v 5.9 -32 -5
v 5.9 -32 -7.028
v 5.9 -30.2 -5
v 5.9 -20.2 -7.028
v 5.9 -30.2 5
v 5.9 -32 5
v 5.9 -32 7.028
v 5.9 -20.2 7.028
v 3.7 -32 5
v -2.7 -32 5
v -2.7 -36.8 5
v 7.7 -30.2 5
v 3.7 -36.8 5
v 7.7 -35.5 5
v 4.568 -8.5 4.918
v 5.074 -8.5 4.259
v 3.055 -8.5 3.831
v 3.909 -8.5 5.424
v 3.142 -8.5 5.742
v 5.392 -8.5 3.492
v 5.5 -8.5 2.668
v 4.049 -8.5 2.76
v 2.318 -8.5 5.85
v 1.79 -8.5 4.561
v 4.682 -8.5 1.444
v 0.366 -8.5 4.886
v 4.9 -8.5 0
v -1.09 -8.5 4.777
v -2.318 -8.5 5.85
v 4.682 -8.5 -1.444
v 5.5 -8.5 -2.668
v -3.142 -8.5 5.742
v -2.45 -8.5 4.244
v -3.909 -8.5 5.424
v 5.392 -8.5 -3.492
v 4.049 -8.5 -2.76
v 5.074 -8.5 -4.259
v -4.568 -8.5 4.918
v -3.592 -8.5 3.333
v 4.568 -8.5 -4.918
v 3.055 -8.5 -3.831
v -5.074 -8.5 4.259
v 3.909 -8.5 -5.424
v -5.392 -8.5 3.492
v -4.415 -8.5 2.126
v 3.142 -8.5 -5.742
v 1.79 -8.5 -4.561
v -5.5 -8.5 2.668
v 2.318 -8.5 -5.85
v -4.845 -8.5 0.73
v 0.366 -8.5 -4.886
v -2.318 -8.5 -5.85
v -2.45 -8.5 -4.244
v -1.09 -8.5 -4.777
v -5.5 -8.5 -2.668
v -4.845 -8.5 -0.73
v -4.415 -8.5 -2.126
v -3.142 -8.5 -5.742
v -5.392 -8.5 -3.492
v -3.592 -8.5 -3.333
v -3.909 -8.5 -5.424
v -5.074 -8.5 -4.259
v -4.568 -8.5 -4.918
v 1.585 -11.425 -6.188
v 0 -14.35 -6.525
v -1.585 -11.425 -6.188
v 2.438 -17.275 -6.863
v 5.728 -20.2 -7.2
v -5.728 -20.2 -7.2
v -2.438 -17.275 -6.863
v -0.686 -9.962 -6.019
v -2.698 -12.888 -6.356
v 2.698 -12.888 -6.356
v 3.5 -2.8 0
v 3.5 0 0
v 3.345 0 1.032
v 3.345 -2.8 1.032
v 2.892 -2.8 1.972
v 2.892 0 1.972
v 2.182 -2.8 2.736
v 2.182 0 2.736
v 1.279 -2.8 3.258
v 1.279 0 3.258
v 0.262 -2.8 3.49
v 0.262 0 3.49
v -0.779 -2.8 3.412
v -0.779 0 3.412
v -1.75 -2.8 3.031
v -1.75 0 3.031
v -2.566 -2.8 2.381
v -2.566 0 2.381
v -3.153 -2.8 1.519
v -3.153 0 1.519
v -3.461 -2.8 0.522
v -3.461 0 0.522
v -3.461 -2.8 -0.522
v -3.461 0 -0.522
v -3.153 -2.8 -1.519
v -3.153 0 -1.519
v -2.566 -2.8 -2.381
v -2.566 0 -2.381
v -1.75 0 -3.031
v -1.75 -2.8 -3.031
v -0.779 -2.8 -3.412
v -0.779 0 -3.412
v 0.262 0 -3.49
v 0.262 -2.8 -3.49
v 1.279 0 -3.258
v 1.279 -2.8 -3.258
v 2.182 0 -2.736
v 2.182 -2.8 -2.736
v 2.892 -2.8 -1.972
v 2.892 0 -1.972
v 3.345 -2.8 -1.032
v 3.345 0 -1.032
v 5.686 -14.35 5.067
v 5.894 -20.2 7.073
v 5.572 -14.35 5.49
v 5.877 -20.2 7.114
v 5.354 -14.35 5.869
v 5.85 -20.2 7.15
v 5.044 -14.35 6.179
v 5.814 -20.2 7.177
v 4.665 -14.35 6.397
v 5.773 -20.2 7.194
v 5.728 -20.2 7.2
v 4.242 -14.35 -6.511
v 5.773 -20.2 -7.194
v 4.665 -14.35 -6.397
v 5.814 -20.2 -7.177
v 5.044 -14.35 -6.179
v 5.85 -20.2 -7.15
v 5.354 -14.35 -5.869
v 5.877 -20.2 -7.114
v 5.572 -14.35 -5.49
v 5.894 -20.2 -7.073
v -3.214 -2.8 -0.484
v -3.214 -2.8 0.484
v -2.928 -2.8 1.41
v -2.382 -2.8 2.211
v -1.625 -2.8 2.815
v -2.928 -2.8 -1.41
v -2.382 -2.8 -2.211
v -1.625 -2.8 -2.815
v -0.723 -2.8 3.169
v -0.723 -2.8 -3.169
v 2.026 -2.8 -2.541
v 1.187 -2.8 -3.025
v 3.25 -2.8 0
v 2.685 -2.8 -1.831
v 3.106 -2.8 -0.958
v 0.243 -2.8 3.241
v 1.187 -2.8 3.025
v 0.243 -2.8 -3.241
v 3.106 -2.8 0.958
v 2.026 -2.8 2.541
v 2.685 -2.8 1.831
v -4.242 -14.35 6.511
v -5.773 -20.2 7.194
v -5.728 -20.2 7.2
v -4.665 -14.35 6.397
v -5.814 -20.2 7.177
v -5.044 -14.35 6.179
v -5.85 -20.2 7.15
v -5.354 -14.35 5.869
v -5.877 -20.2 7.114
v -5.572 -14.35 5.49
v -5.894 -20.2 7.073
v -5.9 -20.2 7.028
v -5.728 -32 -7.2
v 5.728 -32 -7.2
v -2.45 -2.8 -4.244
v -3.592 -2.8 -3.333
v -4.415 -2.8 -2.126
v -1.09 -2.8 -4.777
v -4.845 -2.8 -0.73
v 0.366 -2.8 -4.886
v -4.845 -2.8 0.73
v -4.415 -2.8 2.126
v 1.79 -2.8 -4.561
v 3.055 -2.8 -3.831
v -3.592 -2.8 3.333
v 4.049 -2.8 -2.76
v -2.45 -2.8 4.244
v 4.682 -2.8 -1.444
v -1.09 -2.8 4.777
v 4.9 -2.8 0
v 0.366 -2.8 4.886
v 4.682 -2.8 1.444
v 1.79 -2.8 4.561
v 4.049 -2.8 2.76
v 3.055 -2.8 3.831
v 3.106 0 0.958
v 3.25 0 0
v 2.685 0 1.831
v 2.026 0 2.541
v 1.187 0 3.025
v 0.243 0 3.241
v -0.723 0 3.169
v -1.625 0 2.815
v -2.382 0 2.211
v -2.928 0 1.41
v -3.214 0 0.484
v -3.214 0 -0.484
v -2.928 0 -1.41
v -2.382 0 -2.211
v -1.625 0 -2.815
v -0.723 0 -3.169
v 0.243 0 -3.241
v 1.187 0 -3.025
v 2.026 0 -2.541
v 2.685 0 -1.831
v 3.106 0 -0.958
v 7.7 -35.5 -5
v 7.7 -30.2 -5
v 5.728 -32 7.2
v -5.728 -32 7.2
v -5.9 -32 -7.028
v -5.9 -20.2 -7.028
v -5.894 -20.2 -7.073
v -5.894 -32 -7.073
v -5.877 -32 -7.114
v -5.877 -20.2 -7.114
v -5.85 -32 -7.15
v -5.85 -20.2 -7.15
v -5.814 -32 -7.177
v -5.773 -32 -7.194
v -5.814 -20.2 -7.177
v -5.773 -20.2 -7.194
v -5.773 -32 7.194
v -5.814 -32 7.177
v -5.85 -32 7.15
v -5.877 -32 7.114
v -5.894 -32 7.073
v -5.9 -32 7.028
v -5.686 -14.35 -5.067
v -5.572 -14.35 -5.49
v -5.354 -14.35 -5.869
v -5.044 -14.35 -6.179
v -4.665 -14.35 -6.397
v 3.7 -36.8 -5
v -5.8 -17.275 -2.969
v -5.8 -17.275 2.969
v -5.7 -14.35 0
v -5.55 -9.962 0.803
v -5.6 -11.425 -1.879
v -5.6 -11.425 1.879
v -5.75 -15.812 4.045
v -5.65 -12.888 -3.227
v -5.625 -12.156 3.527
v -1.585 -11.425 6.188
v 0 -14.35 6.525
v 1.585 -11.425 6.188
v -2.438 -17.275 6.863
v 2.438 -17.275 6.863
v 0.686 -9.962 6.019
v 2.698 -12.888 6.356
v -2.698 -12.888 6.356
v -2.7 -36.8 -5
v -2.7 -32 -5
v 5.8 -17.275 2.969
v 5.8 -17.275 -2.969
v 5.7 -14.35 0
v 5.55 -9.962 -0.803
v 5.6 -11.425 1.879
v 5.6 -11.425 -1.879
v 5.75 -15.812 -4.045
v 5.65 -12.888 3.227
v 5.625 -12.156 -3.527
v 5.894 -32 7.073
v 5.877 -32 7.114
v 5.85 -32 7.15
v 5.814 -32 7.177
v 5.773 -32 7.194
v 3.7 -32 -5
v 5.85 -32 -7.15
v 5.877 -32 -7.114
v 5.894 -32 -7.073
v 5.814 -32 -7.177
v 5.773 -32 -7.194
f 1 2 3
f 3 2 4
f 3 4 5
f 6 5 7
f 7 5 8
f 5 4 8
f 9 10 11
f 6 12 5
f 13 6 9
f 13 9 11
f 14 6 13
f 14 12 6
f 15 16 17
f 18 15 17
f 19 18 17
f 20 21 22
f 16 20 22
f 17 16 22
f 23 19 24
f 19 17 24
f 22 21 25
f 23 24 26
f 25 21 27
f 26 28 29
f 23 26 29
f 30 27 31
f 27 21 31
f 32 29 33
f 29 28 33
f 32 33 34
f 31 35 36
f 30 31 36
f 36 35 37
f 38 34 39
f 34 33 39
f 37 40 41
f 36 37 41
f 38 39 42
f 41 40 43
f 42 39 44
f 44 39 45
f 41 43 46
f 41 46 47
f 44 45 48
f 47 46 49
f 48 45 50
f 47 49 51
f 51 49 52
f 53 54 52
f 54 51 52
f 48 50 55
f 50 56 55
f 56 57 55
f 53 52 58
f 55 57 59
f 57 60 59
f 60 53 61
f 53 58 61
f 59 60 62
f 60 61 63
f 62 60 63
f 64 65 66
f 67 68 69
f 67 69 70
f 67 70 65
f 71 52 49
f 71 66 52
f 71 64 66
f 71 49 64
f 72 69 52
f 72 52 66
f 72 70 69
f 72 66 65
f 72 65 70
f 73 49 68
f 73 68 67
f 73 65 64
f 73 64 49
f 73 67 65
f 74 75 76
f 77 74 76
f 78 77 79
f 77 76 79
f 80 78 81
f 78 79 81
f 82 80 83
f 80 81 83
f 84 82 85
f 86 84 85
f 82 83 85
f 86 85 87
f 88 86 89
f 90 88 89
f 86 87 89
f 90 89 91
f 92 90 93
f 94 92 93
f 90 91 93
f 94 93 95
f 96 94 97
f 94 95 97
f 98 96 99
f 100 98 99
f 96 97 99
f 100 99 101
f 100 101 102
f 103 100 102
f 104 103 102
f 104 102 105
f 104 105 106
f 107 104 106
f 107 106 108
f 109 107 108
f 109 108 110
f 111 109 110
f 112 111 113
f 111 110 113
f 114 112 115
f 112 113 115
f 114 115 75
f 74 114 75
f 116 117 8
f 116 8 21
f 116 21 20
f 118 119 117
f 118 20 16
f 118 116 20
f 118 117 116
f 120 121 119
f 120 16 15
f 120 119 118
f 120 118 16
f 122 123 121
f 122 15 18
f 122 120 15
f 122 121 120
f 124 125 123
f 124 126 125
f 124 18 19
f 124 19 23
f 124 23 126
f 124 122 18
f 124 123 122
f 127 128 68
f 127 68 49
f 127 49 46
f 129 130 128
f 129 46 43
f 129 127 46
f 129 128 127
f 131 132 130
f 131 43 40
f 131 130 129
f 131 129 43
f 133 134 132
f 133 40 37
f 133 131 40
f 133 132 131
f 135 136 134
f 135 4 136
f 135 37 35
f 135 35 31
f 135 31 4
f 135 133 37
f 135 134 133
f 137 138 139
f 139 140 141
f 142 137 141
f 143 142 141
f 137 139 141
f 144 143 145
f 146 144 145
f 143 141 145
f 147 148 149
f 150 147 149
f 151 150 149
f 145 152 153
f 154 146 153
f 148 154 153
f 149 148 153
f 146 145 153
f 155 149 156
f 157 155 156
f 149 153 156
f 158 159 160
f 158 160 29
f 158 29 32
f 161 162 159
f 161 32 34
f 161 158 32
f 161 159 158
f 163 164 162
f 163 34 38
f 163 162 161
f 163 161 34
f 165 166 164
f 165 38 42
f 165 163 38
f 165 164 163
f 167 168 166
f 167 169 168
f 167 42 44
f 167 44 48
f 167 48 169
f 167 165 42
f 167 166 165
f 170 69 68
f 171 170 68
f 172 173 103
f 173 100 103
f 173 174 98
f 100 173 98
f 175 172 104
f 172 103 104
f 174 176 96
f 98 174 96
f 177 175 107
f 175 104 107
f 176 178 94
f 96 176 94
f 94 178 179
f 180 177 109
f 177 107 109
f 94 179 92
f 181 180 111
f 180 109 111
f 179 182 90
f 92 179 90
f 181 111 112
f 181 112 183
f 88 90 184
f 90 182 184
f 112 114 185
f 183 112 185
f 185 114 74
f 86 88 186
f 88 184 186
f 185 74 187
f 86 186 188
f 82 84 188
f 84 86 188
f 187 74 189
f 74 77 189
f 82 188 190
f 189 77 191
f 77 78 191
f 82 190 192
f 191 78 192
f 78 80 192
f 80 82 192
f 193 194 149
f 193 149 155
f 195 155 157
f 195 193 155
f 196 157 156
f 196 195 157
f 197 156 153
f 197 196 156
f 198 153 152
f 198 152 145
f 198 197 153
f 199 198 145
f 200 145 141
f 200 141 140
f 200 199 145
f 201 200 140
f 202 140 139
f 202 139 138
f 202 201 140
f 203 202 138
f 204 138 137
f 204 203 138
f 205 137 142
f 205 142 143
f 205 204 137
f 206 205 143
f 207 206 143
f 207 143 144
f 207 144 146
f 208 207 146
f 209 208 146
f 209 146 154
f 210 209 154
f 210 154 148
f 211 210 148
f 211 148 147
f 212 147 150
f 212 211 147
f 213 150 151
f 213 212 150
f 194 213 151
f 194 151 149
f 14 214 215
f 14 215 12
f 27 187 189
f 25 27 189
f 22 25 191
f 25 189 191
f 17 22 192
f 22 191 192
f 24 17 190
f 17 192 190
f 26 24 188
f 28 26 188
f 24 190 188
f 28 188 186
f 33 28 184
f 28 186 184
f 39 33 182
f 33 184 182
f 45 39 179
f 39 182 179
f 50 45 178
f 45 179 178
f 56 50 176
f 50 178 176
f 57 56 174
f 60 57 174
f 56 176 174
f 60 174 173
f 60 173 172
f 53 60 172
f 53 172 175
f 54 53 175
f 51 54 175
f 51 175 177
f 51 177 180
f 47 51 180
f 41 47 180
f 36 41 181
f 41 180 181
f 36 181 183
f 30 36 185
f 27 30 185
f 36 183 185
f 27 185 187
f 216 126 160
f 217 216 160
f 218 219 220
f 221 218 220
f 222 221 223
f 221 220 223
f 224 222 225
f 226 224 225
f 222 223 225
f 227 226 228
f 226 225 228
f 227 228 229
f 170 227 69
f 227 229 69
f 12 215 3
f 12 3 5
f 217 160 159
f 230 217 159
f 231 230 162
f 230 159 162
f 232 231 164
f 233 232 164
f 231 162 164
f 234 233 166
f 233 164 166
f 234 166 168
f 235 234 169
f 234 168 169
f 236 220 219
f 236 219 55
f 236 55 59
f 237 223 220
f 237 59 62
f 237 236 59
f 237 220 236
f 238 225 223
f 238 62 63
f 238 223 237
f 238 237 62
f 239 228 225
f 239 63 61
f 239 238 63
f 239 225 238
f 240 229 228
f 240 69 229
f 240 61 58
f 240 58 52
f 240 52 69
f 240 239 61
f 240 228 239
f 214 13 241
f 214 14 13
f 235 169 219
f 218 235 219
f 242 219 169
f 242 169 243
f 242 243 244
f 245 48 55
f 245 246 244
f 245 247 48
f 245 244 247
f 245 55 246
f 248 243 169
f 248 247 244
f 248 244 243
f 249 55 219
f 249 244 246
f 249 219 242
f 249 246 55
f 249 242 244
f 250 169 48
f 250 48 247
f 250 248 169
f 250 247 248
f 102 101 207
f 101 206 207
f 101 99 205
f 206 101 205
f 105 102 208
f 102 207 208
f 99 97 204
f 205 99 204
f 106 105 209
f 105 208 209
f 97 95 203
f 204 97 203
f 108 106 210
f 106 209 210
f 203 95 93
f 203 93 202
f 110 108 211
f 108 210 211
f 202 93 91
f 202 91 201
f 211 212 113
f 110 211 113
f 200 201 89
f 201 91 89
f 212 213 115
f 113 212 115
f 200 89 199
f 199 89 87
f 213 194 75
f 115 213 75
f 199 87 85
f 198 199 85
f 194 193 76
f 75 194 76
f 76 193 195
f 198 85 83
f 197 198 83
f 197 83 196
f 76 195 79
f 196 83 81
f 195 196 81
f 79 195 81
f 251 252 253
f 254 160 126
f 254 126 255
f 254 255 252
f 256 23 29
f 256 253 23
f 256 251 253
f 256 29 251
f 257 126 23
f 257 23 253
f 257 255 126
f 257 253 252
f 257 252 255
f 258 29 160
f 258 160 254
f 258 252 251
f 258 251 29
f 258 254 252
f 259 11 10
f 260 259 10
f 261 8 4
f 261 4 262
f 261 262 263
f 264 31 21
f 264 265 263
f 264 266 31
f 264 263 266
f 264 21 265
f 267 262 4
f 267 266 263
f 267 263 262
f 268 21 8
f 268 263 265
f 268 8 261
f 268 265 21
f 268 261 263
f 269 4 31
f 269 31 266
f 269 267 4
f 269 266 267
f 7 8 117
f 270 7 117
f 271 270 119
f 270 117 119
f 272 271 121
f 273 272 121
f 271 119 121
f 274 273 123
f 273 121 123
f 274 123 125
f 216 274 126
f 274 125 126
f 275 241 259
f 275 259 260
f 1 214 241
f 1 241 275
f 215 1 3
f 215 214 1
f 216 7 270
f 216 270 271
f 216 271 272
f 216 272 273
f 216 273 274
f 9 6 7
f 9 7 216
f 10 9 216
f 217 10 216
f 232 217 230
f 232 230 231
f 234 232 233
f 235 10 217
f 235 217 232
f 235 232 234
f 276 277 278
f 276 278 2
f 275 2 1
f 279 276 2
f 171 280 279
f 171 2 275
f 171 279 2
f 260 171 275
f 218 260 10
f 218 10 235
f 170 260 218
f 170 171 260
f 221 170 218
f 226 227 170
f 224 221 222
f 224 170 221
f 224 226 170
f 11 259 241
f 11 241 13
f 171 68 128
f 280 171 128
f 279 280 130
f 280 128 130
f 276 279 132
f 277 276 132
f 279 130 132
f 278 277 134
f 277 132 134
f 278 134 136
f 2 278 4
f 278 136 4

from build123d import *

# Parameters (mm, degrees)
SKETCH_R     = 3.5
SKETCH_R_2   = 3.25
PAD_DEPTH    = 2.8
SKETCH001_R  = 4.9
PAD001_DEPTH = 5.7
PAD002_DEPTH = 11.8
SKETCH004_W  = 6.6
SKETCH004_H  = 10
PAD003_DEPTH = 6.4
SKETCH005_W  = 10
SKETCH005_H  = 6.6
SKETCH006_W  = 10
SKETCH006_H  = 5.3


with BuildPart() as part:
    # Sketch → Pad (new body)
    with BuildSketch(Plane.XZ):
        Circle(SKETCH_R)
        Circle(SKETCH_R_2, mode=Mode.SUBTRACT)
    extrude(amount=PAD_DEPTH)

    # Sketch001 (on Face4 of Pad) → Pad001 (join)
    with BuildSketch(Plane.XZ.offset(2.8)):
        Circle(SKETCH001_R)
    extrude(amount=PAD001_DEPTH)

    # Sketch002 → AdditiveLoft section 0
    with BuildSketch(Plane.XZ.offset(8.5)):
        with BuildLine():
            Line((-5.5, 2.668195), (-5.5, -2.668195))
            ThreePointArc((-5.5, -2.668195), (-4.568071, -4.918071), (-2.318195, -5.85))
            Line((-2.318195, -5.85), (2.318195, -5.85))
            ThreePointArc((2.318195, -5.85), (4.568071, -4.918071), (5.5, -2.668195))
            Line((5.5, -2.668195), (5.5, 2.668195))
            ThreePointArc((5.5, 2.668195), (4.568071, 4.918071), (2.318195, 5.85))
            Line((2.318195, 5.85), (-2.318195, 5.85))
            ThreePointArc((-2.318195, 5.85), (-4.568071, 4.918071), (-5.5, 2.668195))
        make_face()
    # Sketch003 → AdditiveLoft section 1
    with BuildSketch(Plane.XZ.offset(20.2)):
        with BuildLine():
            Line((-5.9, 7.028436), (-5.9, -7.028436))
            ThreePointArc((-5.9, -7.028436), (-5.84975, -7.14975), (-5.728436, -7.2))
            Line((-5.728436, -7.2), (5.728436, -7.2))
            ThreePointArc((5.728436, -7.2), (5.84975, -7.14975), (5.9, -7.028436))
            Line((5.9, -7.028436), (5.9, 7.028436))
            ThreePointArc((5.9, 7.028436), (5.84975, 7.14975), (5.728436, 7.2))
            Line((5.728436, 7.2), (-5.728436, 7.2))
            ThreePointArc((-5.728436, 7.2), (-5.84975, 7.14975), (-5.9, 7.028436))
        make_face()
    loft()

    # AdditiveLoft Face11 → Pad002 (add)
    with BuildSketch(Plane(origin=(0, -20.2, 0), x_dir=(-1, 0, 0), z_dir=(0, -1, 0))):
        with BuildLine():
            Line((5.9, -7.028436), (5.9, 7.028436))
            ThreePointArc((5.9, 7.028436), (5.84975, 7.14975), (5.728436, 7.2))
            Line((5.728436, 7.2), (-5.728436, 7.2))
            ThreePointArc((-5.728436, 7.2), (-5.84975, 7.14975), (-5.9, 7.028436))
            Line((-5.9, 7.028436), (-5.9, -7.028436))
            ThreePointArc((-5.9, -7.028436), (-5.84975, -7.14975), (-5.728436, -7.2))
            Line((-5.728436, -7.2), (5.728436, -7.2))
            ThreePointArc((5.728436, -7.2), (5.84975, -7.14975), (5.9, -7.028436))
        make_face()
    extrude(amount=PAD002_DEPTH)

    # Sketch004 → Pad003 (join)
    with BuildSketch(Plane.YZ.offset(-2.7)):
        with Locations((-33.5, 0)):
            Rectangle(SKETCH004_W, SKETCH004_H)
    extrude(amount=PAD003_DEPTH)

    # Sketch005 (on Face22 of Pad003) → AdditiveLoft001 section 0
    with BuildSketch(Plane(origin=(3.7, 0, 0), x_dir=(0, 0, 1), z_dir=(1, 0, 0))):
        with Locations((0, 33.5)):
            Rectangle(SKETCH005_W, SKETCH005_H)
    # Sketch006 (on Face22 of Pad003) → AdditiveLoft001 section 1
    with BuildSketch(Plane(origin=(7.7, 0, 0), x_dir=(0, 0, 1), z_dir=(1, 0, 0))):
        with Locations((0, 32.85)):
            Rectangle(SKETCH006_W, SKETCH006_H)
    loft()


solid = part.part
